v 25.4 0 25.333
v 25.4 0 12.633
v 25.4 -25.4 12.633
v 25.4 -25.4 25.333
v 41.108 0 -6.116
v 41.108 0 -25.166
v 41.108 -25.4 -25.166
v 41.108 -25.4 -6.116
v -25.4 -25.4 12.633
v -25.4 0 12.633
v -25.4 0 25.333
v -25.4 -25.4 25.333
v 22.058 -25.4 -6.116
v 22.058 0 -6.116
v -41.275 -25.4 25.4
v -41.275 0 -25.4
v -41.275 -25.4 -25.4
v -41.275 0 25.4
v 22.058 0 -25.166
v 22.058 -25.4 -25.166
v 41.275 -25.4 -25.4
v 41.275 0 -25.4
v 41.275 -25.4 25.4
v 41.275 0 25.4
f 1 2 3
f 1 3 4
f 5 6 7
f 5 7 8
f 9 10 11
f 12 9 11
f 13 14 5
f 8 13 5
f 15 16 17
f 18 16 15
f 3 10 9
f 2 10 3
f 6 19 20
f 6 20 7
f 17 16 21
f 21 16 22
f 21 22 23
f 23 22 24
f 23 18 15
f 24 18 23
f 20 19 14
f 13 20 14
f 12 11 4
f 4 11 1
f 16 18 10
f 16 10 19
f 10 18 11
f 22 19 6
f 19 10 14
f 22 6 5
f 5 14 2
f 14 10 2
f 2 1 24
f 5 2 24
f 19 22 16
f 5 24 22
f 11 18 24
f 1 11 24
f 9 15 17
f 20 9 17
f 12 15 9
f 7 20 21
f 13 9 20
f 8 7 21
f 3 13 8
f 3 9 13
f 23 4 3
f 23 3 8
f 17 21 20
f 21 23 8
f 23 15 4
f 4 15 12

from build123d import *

# Parameters (mm, degrees)
F0_W     = 82.55
F0_H     = 50.8
F1_DEPTH = 25.4
F2_W     = 50.8
F2_H     = 12.7
F3_DEPTH = 50.292
F4_W     = 19.05
F4_H     = 19.05
F5_DEPTH = 72.644


with BuildPart() as f1:
    # F0 (on Front) → F1 (new body)
    with BuildSketch(Plane.XZ):
        Rectangle(F0_W, F0_H)
    extrude(amount=F1_DEPTH)

    # F2 (on Front) → F3 (cut)
    with BuildSketch(Plane.XZ):
        with Locations((0, 18.983158)):
            Rectangle(F2_W, F2_H)
    extrude(amount=F3_DEPTH, mode=Mode.SUBTRACT)

    # F4 (on Front) → F5 (cut)
    with BuildSketch(Plane.XZ):
        with Locations((31.582892, -15.641052)):
            Rectangle(F4_W, F4_H)
    extrude(amount=F5_DEPTH, mode=Mode.SUBTRACT)


solid = f1.part
